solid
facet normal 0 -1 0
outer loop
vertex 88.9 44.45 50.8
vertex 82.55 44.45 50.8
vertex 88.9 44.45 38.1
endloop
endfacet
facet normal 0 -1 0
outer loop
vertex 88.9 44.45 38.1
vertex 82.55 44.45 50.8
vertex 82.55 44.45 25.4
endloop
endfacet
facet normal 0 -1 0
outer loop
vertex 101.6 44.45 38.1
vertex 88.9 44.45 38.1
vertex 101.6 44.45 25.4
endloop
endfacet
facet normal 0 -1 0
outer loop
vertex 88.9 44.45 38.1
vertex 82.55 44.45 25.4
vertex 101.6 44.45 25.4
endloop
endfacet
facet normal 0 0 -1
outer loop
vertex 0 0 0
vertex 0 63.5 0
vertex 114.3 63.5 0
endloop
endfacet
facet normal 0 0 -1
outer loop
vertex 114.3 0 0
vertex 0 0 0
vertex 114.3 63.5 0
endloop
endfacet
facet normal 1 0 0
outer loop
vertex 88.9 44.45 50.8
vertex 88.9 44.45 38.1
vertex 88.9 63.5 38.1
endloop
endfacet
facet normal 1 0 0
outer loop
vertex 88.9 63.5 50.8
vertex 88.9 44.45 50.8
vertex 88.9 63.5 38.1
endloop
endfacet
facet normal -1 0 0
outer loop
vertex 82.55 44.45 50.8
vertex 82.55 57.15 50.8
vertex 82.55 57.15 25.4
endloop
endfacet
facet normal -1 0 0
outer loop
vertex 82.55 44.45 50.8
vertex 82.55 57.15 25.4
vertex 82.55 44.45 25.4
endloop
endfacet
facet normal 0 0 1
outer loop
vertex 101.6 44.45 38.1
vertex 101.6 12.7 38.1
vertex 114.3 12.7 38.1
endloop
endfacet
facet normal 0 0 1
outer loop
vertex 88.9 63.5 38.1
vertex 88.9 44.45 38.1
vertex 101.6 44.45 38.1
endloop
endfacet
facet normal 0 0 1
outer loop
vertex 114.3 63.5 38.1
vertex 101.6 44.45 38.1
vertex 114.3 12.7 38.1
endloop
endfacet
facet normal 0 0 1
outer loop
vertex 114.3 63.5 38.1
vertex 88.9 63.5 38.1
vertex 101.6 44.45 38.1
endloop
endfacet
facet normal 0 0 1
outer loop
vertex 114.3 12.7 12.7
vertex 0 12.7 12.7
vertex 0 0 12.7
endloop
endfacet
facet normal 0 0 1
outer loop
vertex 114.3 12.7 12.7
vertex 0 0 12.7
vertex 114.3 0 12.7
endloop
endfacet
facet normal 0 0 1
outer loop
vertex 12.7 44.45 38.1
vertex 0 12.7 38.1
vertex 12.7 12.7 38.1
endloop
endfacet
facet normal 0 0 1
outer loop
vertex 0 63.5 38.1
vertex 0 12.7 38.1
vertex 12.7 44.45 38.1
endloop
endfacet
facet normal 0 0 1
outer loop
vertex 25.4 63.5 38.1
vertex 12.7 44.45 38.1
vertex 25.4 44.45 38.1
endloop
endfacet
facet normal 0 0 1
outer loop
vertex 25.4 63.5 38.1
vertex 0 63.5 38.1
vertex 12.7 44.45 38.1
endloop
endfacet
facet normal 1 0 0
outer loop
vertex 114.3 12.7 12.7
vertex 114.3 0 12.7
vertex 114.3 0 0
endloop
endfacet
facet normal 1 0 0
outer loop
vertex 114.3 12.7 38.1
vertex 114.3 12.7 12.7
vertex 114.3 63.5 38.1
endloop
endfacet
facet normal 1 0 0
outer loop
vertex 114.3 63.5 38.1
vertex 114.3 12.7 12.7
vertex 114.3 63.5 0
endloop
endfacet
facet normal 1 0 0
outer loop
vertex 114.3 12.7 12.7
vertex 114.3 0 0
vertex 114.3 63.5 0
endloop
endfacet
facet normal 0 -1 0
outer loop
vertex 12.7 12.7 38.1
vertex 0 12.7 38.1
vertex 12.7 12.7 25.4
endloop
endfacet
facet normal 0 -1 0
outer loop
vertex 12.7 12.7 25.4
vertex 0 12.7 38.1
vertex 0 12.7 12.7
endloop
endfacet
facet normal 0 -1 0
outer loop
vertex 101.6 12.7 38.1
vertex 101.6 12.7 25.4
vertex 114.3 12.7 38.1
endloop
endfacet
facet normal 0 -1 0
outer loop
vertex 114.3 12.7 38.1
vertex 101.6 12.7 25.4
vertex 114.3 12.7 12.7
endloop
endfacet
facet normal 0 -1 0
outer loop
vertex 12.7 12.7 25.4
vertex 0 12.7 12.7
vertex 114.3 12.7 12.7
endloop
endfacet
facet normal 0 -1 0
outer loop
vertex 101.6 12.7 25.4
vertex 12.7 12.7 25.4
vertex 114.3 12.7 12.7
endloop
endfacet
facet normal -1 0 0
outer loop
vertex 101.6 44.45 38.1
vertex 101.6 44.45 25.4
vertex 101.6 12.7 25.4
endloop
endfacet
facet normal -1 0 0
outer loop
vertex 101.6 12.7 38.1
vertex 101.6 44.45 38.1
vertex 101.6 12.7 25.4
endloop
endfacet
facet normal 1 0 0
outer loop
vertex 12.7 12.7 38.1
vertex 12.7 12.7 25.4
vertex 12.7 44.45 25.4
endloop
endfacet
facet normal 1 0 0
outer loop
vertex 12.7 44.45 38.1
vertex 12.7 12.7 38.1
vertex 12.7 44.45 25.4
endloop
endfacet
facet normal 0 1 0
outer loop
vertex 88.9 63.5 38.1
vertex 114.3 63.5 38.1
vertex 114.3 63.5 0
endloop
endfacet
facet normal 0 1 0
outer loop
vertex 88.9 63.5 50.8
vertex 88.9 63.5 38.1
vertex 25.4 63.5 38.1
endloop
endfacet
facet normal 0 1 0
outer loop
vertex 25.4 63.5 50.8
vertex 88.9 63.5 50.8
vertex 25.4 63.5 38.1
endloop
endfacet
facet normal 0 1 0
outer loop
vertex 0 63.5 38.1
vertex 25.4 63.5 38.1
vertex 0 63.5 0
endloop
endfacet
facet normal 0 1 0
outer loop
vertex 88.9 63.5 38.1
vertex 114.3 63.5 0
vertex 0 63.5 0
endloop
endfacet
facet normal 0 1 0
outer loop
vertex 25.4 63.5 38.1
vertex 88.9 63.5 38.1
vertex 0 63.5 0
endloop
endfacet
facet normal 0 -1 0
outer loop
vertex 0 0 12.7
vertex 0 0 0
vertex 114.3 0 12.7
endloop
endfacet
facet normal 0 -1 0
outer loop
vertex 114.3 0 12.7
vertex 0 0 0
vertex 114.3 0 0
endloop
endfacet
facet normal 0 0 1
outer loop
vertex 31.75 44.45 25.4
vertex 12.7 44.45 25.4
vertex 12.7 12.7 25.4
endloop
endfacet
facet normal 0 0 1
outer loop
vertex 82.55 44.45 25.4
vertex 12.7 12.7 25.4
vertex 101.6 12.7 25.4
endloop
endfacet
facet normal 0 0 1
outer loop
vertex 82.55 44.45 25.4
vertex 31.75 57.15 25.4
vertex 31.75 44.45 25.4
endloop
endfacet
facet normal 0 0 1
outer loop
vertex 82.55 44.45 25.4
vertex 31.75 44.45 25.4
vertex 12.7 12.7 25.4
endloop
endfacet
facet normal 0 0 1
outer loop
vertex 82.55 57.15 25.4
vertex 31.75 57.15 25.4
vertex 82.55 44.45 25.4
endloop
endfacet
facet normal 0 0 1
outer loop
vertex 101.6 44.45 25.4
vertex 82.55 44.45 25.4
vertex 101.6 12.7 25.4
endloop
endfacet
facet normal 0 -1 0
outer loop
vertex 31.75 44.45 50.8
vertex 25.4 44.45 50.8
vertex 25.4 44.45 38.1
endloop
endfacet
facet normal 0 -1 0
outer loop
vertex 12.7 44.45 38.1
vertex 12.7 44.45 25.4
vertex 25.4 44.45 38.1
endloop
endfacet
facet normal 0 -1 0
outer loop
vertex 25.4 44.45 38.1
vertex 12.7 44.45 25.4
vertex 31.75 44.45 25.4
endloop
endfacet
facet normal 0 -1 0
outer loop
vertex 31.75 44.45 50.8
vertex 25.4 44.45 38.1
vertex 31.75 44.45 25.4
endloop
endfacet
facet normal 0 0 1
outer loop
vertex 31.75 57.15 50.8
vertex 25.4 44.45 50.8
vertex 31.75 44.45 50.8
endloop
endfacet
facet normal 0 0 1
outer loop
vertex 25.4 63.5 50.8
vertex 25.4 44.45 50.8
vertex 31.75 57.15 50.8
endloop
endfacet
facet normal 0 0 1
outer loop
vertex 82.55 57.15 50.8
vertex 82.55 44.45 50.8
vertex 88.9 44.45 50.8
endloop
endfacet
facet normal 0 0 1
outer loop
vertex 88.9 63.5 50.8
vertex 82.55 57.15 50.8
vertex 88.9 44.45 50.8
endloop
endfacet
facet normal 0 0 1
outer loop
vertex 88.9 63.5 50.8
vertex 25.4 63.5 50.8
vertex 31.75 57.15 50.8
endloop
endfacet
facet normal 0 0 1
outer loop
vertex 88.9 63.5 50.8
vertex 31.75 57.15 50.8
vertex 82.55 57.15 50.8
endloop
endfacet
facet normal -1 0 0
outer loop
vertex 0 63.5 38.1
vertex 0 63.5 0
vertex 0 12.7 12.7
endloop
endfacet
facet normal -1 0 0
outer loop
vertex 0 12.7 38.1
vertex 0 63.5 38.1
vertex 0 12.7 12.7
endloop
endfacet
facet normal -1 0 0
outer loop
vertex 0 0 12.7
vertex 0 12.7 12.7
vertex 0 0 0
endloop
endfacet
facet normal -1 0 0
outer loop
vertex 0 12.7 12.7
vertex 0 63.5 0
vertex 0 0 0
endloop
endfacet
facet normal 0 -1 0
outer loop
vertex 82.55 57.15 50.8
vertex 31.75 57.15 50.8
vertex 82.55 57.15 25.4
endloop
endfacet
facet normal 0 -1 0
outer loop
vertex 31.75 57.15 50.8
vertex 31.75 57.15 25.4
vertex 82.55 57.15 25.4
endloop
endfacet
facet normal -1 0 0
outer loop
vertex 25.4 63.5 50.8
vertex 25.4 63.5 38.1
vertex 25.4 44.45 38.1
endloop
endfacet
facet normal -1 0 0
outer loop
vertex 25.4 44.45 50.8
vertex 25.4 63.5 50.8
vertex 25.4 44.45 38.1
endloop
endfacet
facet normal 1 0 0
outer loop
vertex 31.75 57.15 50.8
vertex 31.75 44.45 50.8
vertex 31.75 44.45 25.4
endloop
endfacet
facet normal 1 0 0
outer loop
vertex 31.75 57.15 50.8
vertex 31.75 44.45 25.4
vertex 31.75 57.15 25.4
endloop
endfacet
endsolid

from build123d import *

# Parameters (mm, degrees)
F0_W     = 114.3
F0_H     = 63.5
F1_DEPTH = 12.7
F2_W     = 114.3
F2_H     = 50.8
F3_DEPTH = 12.7
F5_DEPTH = 12.7
F7_DEPTH = 12.7


with BuildPart() as f1:
    # F0 (on Top) → F1 (new body)
    with BuildSketch(Plane.XY):
        with Locations((57.15, 31.75)):
            Rectangle(F0_W, F0_H)
    extrude(amount=F1_DEPTH)

    # F2 (on face) → F3 (join)
    with BuildSketch(Plane.XY.offset(12.7)):
        with Locations((57.15, 38.1)):
            Rectangle(F2_W, F2_H)
    extrude(amount=F3_DEPTH)

    # F4 (on face) → F5 (join)
    with BuildSketch(Plane.XY.offset(25.4)):
        Polygon((0, 12.7), (12.7, 12.7), (12.7, 44.45), (31.75, 44.45), (31.75, 57.15), (82.55, 57.15), (82.55, 44.45), (101.6, 44.45), (101.6, 12.7), (114.3, 12.7), (114.3, 63.5), (0, 63.5), align=None)
    extrude(amount=F5_DEPTH)

    # F6 (on face) → F7 (join)
    with BuildSketch(Plane.XY.offset(38.1)):
        Polygon((25.4, 63.5), (25.4, 44.45), (31.75, 44.45), (31.75, 57.15), (82.55, 57.15), (82.55, 44.45), (88.9, 44.45), (88.9, 63.5), align=None)
    extrude(amount=F7_DEPTH)


solid = f1.part
